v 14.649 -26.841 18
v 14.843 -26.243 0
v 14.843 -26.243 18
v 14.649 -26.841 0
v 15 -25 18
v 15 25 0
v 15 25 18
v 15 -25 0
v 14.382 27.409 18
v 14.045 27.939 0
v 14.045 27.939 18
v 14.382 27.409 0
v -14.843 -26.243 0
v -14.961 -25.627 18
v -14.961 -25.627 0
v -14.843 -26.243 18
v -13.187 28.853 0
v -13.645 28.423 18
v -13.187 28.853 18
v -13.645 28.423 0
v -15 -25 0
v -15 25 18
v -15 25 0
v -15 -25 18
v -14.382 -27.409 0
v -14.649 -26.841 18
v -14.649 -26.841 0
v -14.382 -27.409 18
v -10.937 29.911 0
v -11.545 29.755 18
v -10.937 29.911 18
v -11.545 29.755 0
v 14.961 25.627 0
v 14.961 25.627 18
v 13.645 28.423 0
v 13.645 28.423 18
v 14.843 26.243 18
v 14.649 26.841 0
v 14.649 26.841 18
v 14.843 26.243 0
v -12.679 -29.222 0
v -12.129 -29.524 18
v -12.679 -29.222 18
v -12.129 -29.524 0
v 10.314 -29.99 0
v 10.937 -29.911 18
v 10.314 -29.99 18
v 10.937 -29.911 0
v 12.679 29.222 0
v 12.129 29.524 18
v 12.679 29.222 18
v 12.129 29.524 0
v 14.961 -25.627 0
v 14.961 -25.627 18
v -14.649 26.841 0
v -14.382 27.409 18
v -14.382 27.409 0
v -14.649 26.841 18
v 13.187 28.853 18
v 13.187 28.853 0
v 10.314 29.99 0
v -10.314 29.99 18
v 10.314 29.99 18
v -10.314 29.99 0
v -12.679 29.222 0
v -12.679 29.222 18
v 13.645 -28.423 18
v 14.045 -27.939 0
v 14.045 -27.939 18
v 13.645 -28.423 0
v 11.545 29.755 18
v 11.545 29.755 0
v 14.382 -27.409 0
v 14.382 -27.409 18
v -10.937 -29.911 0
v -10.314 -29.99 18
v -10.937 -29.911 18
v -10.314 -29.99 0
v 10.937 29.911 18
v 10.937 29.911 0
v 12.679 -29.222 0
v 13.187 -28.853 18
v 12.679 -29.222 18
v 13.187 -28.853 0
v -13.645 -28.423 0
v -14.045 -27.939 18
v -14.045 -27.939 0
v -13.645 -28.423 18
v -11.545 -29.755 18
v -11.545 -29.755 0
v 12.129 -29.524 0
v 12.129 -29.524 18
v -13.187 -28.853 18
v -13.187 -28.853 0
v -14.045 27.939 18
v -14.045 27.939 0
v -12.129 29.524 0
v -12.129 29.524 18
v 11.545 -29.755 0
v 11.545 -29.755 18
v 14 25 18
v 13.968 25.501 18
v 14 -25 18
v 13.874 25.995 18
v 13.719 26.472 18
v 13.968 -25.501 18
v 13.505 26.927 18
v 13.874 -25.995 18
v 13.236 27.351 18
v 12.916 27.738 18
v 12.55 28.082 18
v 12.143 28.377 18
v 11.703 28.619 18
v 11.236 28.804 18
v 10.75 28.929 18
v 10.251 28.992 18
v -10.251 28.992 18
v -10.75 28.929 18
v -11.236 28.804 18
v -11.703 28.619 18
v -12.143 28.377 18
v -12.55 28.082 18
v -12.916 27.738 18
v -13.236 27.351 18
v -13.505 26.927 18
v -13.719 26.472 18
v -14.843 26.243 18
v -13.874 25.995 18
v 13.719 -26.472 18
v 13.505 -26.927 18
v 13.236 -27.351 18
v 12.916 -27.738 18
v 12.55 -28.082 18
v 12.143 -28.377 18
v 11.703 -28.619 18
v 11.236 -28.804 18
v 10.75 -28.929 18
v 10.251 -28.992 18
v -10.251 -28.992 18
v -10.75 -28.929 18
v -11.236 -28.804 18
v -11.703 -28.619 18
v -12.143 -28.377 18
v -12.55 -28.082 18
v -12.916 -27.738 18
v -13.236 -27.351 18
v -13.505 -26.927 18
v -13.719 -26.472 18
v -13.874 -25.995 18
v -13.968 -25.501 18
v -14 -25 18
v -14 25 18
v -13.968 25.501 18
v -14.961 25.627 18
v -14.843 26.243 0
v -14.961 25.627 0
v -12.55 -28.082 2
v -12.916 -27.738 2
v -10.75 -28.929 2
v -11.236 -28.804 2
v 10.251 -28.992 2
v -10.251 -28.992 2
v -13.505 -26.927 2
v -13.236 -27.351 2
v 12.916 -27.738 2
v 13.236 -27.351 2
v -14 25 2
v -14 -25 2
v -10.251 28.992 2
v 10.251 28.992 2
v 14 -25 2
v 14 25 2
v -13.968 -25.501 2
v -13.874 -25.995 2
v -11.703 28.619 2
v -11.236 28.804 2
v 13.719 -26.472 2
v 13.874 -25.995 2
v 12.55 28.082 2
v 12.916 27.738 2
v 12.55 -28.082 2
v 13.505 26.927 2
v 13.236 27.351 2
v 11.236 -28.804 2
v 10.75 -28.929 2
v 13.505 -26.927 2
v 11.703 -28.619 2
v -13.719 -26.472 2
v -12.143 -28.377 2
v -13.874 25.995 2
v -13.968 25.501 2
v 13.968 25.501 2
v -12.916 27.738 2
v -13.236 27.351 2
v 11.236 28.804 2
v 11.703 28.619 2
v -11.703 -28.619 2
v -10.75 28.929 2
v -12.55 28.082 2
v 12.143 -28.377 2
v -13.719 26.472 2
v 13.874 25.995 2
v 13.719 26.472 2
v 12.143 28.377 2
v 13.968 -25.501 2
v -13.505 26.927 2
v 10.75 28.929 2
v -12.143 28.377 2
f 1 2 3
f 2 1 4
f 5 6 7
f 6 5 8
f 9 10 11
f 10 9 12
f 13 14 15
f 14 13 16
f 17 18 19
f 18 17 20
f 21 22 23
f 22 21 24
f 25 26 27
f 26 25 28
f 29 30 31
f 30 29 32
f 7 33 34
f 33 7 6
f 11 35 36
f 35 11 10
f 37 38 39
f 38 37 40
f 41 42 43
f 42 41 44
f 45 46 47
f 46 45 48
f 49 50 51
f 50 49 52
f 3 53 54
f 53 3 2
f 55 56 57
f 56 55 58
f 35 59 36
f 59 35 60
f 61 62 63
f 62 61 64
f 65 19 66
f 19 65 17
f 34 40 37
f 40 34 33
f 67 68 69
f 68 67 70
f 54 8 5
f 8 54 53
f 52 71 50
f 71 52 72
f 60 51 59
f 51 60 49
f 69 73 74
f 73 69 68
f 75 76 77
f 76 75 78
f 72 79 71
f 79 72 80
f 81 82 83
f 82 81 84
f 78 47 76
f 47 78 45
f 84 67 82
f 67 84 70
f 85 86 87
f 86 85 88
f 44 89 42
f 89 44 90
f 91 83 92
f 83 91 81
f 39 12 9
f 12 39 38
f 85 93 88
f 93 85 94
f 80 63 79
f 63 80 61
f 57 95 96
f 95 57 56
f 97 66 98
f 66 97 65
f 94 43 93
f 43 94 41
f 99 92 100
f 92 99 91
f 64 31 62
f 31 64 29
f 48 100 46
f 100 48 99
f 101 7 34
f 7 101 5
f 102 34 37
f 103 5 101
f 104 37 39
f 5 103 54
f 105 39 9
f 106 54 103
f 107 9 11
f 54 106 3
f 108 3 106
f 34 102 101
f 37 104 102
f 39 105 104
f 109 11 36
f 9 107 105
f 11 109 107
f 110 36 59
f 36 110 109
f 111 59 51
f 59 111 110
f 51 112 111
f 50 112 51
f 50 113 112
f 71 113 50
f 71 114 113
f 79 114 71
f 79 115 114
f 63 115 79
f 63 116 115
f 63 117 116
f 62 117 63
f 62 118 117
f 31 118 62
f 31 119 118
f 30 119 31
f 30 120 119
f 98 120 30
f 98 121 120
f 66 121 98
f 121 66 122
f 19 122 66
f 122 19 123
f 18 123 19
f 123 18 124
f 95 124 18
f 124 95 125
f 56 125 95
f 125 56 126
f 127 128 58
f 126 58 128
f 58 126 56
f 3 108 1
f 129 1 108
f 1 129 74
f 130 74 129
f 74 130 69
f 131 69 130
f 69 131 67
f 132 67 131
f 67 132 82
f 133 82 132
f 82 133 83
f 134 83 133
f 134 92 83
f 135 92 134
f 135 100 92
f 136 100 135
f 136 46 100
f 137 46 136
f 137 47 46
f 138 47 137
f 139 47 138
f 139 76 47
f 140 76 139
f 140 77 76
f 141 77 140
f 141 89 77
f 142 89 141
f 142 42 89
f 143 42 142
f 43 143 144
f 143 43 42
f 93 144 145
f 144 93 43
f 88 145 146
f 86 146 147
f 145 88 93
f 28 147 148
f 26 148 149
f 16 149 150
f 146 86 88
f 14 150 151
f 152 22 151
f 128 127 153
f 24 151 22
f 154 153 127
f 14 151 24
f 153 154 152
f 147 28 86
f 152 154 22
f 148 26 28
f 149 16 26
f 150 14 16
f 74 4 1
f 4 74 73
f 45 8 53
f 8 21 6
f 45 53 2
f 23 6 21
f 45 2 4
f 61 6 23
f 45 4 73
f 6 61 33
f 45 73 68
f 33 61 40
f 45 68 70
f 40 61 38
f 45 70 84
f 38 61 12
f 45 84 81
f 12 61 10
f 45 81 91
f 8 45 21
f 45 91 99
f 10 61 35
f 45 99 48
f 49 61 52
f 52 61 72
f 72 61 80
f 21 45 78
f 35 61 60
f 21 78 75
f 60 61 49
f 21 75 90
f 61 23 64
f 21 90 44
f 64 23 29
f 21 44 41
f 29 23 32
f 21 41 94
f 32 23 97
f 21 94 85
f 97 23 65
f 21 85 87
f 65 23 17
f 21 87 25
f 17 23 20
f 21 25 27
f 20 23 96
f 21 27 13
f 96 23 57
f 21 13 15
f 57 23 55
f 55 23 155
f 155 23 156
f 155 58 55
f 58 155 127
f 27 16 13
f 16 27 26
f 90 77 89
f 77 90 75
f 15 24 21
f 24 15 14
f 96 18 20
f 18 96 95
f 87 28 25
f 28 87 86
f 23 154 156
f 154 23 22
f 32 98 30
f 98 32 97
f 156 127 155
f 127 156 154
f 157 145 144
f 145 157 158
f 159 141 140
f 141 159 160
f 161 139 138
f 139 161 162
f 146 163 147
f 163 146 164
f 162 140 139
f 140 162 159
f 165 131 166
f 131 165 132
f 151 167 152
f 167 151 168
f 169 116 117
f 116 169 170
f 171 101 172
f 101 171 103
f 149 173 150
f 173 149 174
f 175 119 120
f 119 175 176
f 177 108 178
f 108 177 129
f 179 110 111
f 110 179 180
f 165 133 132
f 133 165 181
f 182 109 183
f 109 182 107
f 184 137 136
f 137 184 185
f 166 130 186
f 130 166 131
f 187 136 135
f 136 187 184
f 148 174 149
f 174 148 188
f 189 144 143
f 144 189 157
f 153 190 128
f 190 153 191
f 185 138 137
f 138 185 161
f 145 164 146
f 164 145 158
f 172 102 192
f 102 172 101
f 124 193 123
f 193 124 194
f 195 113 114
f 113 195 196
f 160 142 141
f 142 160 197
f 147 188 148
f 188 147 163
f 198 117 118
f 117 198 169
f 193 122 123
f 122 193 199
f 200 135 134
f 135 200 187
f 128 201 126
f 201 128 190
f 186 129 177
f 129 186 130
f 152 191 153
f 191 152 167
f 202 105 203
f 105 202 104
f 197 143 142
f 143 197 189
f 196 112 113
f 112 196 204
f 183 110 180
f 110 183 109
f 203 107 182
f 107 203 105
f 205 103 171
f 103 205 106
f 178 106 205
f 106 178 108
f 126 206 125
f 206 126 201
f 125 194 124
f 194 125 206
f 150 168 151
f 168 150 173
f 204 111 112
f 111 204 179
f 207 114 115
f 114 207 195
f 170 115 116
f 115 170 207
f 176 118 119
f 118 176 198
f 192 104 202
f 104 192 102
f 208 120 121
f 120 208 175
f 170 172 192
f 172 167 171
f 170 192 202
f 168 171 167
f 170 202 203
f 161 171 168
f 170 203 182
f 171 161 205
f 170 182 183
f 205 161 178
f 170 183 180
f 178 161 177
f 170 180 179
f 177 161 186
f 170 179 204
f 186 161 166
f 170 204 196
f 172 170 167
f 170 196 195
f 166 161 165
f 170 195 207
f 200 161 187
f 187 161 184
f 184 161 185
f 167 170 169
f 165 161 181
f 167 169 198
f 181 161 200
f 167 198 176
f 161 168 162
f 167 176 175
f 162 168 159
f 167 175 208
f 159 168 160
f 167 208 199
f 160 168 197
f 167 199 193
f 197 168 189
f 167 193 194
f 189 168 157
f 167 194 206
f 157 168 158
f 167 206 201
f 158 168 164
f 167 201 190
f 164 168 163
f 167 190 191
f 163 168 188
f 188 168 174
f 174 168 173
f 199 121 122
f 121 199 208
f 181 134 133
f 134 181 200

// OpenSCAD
$fn = 50;


difference() {
	union() {
		hull() {
			translate(v = [-10.0000000000, 25.0000000000, 0]) {
				cylinder(h = 18, r = 5);
			}
			translate(v = [10.0000000000, 25.0000000000, 0]) {
				cylinder(h = 18, r = 5);
			}
			translate(v = [-10.0000000000, -25.0000000000, 0]) {
				cylinder(h = 18, r = 5);
			}
			translate(v = [10.0000000000, -25.0000000000, 0]) {
				cylinder(h = 18, r = 5);
			}
		}
	}
	union() {
		translate(v = [0, 0, 2]) {
			hull() {
				translate(v = [-10.0000000000, 25.0000000000, 0]) {
					cylinder(h = 16, r = 4);
				}
				translate(v = [10.0000000000, 25.0000000000, 0]) {
					cylinder(h = 16, r = 4);
				}
				translate(v = [-10.0000000000, -25.0000000000, 0]) {
					cylinder(h = 16, r = 4);
				}
				translate(v = [10.0000000000, -25.0000000000, 0]) {
					cylinder(h = 16, r = 4);
				}
			}
		}
	}
}
